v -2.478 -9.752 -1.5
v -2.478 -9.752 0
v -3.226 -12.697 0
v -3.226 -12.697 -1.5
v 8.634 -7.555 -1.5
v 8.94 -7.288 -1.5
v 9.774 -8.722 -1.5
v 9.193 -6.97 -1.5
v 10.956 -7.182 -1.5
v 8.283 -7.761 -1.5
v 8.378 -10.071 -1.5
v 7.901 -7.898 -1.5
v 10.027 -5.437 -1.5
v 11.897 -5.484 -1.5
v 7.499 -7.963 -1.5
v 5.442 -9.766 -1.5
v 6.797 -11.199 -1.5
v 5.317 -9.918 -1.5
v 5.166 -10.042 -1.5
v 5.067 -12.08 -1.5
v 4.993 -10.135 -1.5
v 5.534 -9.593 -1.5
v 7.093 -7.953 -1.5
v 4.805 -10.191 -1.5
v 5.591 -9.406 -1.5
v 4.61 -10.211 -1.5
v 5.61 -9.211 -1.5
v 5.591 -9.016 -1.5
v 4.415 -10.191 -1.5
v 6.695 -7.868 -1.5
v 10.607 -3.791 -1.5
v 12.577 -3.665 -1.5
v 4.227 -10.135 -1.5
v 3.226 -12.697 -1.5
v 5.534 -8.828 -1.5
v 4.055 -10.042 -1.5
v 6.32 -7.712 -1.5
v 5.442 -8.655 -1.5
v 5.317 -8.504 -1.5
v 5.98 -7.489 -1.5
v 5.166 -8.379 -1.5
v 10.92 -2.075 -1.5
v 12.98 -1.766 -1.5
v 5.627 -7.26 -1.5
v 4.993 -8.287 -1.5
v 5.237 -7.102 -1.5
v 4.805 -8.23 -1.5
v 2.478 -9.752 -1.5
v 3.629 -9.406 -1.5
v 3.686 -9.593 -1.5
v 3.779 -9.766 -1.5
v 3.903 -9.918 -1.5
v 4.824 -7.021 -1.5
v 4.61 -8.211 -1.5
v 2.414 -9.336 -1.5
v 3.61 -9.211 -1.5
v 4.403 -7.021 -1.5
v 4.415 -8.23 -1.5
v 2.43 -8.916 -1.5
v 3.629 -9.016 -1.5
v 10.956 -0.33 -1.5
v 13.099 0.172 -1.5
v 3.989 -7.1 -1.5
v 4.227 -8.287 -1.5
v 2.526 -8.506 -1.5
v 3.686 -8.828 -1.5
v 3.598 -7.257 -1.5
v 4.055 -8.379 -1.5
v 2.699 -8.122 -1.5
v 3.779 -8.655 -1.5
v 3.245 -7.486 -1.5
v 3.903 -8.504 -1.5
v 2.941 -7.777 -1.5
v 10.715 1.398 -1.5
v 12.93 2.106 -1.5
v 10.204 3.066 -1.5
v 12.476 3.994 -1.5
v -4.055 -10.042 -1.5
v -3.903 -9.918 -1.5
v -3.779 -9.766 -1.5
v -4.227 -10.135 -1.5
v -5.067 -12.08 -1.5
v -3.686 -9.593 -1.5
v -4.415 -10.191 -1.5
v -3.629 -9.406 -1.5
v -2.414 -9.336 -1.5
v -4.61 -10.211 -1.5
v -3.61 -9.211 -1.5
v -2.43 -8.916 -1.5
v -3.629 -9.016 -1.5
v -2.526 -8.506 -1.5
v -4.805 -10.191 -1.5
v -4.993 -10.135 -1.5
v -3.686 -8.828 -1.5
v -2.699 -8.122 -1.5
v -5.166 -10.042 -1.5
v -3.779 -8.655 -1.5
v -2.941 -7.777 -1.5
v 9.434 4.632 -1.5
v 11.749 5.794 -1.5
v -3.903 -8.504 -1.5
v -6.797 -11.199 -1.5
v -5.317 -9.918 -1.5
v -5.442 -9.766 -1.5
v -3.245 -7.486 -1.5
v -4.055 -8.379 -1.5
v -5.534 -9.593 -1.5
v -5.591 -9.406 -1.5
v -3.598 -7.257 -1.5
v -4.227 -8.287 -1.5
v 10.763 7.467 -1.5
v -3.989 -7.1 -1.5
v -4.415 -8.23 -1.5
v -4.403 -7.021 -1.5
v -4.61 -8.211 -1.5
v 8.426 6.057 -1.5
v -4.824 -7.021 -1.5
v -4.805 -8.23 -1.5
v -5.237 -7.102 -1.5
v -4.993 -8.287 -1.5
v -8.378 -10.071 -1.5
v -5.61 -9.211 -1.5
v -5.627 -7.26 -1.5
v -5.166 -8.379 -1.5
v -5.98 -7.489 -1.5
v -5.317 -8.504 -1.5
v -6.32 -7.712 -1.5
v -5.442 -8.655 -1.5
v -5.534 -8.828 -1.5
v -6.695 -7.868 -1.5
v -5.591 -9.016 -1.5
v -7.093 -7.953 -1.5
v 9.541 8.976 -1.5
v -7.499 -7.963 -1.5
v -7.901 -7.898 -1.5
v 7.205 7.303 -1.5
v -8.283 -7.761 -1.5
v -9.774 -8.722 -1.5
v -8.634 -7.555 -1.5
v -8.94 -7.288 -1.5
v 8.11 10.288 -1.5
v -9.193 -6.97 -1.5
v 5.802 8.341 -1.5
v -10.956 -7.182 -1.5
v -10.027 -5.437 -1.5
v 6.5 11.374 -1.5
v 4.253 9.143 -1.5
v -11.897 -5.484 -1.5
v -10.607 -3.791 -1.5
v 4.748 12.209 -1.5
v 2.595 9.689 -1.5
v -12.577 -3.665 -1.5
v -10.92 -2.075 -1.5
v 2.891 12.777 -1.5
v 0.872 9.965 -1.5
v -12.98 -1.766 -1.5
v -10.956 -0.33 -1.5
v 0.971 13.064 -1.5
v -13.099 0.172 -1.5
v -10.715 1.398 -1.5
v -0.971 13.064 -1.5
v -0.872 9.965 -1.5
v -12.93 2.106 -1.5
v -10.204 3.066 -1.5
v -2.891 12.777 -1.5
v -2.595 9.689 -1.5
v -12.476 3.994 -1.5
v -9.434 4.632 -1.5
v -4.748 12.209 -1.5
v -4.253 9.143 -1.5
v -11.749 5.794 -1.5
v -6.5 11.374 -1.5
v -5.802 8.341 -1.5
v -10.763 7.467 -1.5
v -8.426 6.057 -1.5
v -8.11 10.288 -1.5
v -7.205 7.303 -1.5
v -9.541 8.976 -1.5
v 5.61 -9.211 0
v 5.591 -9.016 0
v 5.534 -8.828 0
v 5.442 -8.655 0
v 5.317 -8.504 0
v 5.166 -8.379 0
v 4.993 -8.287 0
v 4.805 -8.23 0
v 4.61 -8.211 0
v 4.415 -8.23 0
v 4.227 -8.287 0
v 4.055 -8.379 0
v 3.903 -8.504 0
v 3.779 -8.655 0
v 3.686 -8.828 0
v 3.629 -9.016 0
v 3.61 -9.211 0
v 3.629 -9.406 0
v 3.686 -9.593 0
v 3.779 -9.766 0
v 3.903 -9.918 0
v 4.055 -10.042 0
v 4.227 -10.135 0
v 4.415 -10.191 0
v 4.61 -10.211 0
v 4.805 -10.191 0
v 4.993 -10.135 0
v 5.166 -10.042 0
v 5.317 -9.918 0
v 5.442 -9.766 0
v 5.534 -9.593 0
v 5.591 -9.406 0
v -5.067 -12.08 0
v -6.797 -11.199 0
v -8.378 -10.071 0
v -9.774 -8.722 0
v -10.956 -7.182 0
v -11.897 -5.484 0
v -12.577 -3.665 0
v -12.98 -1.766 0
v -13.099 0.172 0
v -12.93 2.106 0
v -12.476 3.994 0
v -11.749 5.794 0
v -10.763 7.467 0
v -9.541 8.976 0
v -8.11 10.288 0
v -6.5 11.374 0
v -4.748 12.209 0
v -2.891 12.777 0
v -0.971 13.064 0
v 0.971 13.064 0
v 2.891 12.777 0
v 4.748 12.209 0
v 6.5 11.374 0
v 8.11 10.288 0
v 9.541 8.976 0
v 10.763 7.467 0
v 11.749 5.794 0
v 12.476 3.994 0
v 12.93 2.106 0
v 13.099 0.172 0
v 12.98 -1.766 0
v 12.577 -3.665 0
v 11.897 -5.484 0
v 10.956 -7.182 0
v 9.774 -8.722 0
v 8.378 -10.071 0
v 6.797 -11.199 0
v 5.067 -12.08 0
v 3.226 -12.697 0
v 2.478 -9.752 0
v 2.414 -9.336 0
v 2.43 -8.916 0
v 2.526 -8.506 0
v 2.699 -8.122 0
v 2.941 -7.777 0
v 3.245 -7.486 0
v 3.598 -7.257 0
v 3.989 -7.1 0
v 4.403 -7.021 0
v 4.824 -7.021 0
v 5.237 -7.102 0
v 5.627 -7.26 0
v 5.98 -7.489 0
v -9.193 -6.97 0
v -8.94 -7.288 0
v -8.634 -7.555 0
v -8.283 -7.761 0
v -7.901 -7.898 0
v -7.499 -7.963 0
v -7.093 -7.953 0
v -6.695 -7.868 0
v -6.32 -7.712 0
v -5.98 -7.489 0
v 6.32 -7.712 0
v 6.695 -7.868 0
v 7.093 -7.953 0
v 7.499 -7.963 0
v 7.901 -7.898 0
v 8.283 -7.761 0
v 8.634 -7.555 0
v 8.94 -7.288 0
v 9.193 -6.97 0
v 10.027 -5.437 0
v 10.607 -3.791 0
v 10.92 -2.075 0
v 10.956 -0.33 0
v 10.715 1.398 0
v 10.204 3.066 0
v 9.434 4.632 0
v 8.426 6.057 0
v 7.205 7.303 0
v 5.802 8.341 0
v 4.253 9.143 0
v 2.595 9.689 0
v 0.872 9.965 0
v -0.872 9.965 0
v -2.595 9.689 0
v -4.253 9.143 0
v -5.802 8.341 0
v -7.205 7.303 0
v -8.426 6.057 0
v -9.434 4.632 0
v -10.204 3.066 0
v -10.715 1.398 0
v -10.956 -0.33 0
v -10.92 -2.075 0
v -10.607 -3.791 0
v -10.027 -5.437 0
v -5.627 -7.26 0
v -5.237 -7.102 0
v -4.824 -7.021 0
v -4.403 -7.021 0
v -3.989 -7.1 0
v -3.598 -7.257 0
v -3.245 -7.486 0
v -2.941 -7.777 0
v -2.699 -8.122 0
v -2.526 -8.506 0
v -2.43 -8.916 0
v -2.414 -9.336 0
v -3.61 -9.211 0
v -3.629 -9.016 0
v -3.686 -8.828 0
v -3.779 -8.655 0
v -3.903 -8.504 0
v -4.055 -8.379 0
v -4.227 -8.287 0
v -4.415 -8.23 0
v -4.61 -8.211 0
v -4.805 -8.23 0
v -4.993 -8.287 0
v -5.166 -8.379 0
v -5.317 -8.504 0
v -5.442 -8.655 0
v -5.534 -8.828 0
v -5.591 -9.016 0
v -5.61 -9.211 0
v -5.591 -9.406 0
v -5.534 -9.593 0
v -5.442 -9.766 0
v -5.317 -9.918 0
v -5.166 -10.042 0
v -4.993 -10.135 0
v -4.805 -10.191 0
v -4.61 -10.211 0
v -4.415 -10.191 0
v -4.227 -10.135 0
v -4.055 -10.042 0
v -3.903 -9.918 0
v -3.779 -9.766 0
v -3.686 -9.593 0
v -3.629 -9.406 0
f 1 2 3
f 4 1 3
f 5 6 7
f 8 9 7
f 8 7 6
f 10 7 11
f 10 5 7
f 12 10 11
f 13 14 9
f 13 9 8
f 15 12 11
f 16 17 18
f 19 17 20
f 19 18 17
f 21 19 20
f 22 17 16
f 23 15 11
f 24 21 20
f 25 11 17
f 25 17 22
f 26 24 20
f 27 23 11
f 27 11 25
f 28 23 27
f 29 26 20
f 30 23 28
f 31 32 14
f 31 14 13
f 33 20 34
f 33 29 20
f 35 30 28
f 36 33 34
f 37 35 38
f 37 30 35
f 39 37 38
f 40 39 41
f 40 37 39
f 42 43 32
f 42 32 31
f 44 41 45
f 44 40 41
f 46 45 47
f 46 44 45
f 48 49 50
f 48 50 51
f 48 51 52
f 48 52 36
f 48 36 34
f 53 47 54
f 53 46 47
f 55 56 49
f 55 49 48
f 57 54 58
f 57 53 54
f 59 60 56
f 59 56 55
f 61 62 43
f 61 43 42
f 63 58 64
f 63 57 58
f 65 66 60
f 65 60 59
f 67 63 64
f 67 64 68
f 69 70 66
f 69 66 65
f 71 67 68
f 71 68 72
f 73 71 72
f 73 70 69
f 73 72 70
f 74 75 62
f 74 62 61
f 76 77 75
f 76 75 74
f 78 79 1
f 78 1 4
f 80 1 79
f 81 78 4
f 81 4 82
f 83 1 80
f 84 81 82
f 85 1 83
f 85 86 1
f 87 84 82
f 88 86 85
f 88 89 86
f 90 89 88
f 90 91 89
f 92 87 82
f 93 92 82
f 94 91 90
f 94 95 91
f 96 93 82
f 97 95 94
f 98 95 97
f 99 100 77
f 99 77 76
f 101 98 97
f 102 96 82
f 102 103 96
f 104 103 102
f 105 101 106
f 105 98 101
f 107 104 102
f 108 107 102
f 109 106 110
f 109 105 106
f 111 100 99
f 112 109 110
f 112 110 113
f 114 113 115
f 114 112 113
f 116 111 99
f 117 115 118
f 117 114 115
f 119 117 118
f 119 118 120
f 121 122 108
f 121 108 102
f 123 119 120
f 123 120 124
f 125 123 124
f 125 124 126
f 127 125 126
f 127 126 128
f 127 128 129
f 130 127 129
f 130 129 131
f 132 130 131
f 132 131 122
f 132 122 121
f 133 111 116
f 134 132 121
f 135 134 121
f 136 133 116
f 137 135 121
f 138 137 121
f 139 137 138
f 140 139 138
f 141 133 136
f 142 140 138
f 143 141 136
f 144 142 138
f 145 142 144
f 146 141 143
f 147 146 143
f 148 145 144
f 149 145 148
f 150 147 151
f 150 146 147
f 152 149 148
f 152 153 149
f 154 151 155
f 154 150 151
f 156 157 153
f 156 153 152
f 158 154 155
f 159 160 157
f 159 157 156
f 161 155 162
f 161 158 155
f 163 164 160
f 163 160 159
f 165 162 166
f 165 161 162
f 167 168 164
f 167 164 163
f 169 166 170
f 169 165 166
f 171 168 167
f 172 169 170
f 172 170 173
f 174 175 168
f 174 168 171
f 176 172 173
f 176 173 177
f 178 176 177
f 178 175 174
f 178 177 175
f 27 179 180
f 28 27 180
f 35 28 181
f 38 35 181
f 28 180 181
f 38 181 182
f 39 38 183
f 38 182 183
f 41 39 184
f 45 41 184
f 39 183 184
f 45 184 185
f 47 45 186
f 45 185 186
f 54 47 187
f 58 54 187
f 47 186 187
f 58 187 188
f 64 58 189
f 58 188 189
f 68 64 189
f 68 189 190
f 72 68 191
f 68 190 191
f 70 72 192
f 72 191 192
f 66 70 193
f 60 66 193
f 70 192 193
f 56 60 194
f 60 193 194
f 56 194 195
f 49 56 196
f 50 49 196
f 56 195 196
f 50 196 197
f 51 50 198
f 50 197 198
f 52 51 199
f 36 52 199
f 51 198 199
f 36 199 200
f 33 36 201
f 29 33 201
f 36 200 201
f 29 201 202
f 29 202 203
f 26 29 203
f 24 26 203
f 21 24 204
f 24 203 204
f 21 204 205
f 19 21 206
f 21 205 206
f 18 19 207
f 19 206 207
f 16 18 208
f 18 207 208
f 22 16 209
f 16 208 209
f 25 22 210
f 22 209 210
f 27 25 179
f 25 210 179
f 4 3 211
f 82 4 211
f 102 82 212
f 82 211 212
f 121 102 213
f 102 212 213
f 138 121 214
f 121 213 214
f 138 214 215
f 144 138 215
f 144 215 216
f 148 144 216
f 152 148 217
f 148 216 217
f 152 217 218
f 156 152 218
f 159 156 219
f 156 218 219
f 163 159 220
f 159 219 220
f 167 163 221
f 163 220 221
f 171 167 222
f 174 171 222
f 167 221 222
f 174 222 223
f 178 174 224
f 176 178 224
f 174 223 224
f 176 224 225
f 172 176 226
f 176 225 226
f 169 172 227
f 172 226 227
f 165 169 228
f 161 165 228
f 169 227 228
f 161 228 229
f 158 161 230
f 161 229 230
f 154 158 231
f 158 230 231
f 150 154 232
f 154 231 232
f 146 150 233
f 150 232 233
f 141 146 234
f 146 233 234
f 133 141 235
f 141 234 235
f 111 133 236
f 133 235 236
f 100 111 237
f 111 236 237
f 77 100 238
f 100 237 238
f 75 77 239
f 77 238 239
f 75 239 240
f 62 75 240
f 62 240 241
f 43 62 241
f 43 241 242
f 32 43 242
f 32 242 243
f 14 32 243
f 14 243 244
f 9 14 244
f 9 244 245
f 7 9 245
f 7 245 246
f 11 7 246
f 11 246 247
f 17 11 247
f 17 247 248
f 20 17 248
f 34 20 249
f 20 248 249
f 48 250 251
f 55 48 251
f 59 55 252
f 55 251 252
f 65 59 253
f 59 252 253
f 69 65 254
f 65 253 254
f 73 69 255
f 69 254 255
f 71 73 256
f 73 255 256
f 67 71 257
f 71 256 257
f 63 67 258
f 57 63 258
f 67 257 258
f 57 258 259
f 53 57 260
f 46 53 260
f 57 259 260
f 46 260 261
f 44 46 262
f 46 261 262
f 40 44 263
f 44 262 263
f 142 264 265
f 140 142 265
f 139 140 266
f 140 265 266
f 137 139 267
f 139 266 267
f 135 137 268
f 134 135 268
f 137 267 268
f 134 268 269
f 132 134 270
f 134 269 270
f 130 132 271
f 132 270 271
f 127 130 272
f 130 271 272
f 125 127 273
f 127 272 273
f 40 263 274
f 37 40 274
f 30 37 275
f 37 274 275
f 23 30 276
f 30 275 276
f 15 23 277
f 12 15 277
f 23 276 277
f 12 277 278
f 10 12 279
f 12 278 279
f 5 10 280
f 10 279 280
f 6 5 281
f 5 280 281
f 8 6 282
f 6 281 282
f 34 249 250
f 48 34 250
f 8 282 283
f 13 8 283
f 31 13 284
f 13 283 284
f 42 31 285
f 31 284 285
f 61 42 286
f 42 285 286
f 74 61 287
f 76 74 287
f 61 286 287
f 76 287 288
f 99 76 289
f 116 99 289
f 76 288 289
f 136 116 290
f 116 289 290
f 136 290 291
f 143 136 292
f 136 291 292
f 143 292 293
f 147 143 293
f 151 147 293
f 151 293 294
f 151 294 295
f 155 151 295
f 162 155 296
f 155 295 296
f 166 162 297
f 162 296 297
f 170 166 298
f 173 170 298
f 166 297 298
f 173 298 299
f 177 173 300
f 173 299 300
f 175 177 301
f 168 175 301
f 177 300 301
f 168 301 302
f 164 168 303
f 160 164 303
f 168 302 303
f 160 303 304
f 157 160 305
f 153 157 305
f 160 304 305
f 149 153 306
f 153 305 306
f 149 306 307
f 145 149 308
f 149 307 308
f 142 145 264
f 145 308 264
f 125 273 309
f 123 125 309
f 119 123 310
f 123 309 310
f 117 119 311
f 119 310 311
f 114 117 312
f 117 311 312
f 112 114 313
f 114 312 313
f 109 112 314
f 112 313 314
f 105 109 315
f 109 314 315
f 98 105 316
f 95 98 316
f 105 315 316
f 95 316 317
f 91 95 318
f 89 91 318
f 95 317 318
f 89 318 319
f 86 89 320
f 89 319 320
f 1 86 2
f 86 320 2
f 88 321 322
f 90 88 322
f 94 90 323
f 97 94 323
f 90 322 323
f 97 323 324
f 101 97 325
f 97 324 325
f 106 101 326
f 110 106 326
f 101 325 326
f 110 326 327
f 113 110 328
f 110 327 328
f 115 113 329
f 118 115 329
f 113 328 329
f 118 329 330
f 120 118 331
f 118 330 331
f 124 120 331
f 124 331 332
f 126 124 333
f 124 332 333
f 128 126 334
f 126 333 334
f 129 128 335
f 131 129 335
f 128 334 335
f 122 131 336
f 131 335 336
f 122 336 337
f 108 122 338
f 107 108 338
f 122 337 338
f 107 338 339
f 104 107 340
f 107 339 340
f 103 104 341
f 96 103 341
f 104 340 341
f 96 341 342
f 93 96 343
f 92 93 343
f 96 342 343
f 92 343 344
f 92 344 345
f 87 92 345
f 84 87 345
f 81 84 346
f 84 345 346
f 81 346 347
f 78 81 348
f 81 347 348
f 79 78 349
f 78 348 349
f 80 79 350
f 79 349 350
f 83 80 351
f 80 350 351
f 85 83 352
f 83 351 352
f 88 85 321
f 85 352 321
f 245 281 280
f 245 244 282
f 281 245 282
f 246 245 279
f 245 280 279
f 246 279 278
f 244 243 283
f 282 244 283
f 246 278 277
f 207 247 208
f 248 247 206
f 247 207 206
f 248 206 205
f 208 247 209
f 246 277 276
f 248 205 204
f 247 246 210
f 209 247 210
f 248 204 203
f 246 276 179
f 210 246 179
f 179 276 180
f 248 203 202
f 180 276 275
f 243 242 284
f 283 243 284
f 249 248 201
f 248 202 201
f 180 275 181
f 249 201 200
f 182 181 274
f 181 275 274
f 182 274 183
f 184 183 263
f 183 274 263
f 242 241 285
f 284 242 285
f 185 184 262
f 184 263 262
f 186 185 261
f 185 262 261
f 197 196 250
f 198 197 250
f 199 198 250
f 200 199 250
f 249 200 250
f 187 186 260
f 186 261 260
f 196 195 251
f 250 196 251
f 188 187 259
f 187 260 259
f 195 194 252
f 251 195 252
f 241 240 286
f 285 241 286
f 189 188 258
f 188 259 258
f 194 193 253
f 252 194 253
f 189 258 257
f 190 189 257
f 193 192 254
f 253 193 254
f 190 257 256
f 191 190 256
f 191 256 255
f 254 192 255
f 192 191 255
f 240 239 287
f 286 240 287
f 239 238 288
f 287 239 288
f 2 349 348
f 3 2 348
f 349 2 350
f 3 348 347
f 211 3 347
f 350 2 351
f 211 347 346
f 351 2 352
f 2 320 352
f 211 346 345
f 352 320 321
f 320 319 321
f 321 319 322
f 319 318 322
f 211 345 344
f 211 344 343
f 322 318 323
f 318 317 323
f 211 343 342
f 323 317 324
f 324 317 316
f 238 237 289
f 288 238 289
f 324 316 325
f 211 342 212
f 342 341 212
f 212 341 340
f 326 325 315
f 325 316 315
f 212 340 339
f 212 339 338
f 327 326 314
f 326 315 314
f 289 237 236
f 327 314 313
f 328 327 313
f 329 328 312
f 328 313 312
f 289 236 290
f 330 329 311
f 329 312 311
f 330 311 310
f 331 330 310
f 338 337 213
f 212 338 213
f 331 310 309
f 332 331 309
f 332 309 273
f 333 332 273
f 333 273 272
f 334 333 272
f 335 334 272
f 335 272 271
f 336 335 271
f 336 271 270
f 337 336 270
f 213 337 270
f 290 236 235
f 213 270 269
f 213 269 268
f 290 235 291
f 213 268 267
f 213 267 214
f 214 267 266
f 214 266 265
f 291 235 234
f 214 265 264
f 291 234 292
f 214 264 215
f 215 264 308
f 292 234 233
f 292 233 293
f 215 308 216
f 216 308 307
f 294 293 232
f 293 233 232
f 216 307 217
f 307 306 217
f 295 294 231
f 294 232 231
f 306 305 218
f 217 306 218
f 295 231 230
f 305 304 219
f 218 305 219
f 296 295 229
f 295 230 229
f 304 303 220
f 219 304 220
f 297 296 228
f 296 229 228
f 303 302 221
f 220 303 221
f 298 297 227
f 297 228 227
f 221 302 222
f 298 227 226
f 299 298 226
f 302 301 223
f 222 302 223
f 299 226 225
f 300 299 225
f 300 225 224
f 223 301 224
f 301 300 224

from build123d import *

# Parameters (mm, degrees)
BODYSKE_R  = 1
BODY_DEPTH = 1.5


with BuildPart() as part:
    # BodySke → Body (new body)
    with BuildSketch(Plane.XY):
        with BuildLine():
            Line((3.225876843, -12.69660264), (2.477844243, -9.752450354))
            ThreePointArc((2.477844243, -9.752450354), (3.416111801, -7.362891432), (5.980158955, -7.489382725))
            ThreePointArc((5.980158955, -7.489382725), (7.701462242, -7.939845491), (9.193020908, -6.96976588))
            ThreePointArc((9.193020908, -6.96976588), (0, 10), (-9.193020908, -6.96976588))
            ThreePointArc((-9.193020908, -6.96976588), (-7.701462242, -7.939845491), (-5.980158955, -7.489382725))
            ThreePointArc((-5.980158955, -7.489382725), (-3.416111801, -7.362891432), (-2.477844243, -9.752450354))
            Line((-2.477844243, -9.752450354), (-3.225876843, -12.69660264))
            ThreePointArc((-3.225876843, -12.69660264), (0, 13.1), (3.225876843, -12.69660264))
        make_face()
        with Locations((4.610098122, -9.210700044)):
            Circle(BODYSKE_R, mode=Mode.SUBTRACT)
        with Locations((-4.610098122, -9.210700044)):
            Circle(BODYSKE_R, mode=Mode.SUBTRACT)
    extrude(amount=-BODY_DEPTH)


solid = part.part
